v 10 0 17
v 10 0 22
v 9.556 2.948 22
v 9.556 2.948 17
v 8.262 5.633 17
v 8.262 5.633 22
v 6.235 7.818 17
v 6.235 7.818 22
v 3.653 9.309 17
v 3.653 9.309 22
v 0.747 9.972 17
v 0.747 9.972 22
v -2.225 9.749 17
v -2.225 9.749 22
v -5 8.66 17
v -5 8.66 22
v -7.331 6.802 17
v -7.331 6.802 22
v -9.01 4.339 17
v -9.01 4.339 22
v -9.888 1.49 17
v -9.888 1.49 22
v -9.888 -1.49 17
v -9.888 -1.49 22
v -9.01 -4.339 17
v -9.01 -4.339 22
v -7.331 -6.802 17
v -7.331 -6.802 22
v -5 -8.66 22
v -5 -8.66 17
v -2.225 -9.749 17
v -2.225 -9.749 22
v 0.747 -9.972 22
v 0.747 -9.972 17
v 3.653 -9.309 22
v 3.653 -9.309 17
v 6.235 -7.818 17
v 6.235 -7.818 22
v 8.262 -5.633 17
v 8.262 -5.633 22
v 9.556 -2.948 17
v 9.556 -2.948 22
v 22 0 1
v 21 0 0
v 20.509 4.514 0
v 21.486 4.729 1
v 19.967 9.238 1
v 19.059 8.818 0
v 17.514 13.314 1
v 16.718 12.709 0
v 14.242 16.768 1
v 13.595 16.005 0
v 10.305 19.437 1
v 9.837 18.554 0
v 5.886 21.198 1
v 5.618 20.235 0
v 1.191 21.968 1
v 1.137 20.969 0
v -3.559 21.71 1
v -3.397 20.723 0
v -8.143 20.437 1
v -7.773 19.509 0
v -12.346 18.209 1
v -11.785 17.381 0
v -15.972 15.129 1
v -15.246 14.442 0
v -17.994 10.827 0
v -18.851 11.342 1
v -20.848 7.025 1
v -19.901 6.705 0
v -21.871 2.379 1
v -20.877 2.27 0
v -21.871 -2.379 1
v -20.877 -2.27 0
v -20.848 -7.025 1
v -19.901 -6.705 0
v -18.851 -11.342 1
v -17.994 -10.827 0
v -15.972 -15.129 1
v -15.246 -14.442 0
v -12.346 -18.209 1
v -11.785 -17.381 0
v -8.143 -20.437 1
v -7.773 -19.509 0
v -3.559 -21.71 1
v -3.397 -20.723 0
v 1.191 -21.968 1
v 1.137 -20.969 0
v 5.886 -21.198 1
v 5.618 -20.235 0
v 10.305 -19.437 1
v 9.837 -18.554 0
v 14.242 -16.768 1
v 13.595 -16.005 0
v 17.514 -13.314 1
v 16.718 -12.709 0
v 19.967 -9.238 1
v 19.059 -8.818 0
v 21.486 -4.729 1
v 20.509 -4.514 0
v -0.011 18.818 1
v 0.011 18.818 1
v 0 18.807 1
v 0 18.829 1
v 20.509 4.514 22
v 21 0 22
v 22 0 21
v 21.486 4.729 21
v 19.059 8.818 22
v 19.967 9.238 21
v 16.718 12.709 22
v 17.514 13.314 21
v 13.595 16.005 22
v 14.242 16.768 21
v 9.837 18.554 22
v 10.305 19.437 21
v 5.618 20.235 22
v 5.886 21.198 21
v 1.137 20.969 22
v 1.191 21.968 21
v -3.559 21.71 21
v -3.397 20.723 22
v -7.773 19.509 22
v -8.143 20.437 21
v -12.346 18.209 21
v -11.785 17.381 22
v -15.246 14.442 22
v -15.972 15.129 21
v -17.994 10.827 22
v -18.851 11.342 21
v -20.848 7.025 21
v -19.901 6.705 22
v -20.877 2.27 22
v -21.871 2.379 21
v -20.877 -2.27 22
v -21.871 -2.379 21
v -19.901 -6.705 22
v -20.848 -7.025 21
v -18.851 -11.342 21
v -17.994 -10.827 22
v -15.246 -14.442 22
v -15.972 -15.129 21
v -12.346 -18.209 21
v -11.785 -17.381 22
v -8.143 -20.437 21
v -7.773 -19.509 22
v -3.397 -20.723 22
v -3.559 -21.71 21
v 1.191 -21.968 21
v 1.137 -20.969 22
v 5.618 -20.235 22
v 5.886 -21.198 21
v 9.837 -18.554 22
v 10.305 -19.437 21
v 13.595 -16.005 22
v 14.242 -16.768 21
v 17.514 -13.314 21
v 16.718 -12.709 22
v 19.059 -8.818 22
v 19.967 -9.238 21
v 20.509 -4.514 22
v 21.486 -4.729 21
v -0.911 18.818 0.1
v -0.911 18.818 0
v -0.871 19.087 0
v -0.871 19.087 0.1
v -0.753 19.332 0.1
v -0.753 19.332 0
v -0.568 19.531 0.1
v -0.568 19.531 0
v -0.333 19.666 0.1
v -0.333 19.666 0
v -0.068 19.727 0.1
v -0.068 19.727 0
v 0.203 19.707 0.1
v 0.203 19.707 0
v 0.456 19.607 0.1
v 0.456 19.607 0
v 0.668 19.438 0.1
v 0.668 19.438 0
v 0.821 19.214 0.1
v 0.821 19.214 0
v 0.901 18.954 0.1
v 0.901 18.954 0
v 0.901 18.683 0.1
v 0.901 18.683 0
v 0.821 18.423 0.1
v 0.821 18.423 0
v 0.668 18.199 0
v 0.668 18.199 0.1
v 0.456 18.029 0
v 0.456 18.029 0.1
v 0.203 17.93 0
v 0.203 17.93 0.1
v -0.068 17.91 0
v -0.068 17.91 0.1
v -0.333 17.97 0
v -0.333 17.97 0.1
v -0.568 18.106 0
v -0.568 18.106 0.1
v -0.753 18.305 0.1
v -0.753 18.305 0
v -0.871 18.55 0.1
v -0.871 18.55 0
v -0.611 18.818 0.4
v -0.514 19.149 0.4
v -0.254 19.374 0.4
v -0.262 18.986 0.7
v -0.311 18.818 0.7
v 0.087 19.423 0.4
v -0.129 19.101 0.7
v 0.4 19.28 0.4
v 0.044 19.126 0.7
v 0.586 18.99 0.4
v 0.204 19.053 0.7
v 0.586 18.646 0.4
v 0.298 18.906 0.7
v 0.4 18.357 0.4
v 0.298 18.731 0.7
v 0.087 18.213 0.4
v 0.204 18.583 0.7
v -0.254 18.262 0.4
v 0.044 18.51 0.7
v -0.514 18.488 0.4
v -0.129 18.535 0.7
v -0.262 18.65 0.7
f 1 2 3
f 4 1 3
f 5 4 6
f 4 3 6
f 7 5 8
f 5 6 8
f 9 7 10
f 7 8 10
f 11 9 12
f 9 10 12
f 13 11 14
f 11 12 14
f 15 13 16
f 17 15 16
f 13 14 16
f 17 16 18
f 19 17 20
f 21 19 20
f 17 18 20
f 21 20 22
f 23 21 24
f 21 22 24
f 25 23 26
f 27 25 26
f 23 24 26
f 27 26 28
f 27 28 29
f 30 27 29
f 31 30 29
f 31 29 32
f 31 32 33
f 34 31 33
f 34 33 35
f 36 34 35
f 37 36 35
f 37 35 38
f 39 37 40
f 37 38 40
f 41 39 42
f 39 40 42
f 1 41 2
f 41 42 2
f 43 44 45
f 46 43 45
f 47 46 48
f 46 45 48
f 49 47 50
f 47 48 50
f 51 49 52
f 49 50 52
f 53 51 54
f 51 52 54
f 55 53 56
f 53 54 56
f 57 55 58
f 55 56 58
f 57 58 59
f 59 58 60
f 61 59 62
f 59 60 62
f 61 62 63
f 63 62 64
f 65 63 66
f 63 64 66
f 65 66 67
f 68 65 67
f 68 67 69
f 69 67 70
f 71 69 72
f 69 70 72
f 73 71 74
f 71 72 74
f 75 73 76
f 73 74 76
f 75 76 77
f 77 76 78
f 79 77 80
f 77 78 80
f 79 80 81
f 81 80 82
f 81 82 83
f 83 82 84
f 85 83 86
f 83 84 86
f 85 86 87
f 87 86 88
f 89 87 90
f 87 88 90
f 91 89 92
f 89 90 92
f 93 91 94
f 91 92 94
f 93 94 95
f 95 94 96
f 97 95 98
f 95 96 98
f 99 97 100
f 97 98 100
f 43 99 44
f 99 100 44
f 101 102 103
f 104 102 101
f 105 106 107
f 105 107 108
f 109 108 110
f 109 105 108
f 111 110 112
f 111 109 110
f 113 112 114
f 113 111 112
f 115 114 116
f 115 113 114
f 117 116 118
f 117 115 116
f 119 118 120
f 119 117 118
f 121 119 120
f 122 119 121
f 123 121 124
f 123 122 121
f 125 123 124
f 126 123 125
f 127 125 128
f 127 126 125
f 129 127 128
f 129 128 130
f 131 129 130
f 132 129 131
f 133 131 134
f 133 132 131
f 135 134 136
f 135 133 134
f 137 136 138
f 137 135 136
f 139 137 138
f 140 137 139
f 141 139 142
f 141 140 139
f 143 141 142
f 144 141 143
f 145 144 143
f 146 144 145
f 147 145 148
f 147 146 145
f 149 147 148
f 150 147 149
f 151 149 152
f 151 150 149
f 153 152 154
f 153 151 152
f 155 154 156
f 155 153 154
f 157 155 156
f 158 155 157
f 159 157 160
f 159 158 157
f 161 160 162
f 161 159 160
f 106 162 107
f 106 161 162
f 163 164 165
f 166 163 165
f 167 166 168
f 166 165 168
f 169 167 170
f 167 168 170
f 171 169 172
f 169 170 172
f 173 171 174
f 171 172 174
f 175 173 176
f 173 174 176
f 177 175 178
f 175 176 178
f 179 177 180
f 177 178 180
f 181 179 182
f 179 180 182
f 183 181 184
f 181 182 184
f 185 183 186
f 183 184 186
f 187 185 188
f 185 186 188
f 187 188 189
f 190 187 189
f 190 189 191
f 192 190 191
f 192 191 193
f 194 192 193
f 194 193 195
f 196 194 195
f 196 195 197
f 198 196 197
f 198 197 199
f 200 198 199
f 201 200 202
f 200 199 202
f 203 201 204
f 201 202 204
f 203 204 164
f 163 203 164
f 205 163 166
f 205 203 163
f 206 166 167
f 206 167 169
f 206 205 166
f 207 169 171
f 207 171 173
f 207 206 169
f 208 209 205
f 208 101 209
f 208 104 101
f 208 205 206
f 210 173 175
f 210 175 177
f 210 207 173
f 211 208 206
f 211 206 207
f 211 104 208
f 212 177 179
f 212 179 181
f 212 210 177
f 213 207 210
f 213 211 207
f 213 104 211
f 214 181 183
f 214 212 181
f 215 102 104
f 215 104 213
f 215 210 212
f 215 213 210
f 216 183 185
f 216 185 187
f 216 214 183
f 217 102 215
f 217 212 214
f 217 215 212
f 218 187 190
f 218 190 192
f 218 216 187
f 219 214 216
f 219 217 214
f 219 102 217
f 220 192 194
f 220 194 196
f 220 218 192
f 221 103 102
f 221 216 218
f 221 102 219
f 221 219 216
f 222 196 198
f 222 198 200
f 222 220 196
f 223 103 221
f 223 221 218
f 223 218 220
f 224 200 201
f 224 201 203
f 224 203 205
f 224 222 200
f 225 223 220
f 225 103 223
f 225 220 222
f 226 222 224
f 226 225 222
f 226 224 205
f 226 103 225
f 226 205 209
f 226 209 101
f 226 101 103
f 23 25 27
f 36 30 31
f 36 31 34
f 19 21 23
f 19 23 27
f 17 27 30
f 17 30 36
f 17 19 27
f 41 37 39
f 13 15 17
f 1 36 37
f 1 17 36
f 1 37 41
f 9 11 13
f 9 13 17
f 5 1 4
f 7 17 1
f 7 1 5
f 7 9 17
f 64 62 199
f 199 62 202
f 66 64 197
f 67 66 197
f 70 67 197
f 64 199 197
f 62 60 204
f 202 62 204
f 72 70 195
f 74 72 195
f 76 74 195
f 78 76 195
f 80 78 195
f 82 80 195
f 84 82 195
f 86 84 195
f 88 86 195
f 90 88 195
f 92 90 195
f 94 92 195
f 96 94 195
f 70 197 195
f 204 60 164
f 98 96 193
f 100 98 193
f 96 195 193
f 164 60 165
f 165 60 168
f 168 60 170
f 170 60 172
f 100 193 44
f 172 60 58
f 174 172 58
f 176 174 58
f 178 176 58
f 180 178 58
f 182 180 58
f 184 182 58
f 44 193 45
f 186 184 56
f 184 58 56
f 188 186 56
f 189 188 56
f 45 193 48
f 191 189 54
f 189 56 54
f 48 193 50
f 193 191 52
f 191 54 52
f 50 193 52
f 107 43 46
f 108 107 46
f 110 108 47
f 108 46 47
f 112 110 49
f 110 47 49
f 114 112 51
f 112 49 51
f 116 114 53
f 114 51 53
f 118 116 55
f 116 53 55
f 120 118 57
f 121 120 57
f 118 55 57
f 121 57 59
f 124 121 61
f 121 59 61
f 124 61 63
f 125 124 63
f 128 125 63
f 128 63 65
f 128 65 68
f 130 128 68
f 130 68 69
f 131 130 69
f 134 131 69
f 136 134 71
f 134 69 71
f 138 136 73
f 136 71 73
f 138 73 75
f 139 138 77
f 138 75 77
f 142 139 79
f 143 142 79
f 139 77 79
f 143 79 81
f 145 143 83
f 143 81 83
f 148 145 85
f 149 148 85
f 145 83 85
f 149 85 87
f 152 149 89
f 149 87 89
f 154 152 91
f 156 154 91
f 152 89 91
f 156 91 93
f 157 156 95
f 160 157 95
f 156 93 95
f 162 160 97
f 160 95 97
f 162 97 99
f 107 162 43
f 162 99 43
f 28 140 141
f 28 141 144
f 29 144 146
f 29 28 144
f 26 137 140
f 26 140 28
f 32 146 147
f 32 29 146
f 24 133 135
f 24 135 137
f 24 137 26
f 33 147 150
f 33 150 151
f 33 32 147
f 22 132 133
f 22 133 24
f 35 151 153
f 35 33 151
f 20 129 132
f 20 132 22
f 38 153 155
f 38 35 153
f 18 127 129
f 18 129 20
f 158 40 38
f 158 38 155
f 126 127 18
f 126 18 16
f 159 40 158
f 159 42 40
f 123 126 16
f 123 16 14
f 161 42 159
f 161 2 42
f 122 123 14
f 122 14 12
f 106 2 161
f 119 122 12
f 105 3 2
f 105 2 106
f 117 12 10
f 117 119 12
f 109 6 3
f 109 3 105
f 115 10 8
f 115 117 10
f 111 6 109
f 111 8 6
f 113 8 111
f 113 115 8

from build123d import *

# Parameters (mm, degrees)
SKETCH_1_R          = 22
EXTRUDE_1_DEPTH     = 22
SKETCH_2_R          = 10
CUT_EXTRUDE_1_DEPTH = 5
CHAMFER_1_SIZE      = 1
SKETCH_3_R          = 0.911044844
CUT_EXTRUDE_2_DEPTH = 1
CHAMFER_2_SIZE      = 0.9


with BuildPart() as part:
    # 草图1 → 凸台-拉伸1 (new body)
    with BuildSketch(Plane.XY):
        Circle(SKETCH_1_R)
    extrude(amount=EXTRUDE_1_DEPTH)

    # 草图2 → 切除-拉伸1 (cut)
    with BuildSketch(Plane.XY.offset(22)):
        Circle(SKETCH_2_R)
    extrude(amount=-CUT_EXTRUDE_1_DEPTH, mode=Mode.SUBTRACT)

    # 倒角1
    chamfer_1_edges = [part.edges().sort_by_distance(p)[0] for p in [
        (-22, 0, 0),
        (-22, 0, 22),
    ]]
    chamfer(chamfer_1_edges, length=CHAMFER_1_SIZE)

    # 草图3 → 切除-拉伸2 (cut)
    with BuildSketch(Plane(origin=(0, 0, 0), x_dir=(-1, 0, 0), z_dir=(0, 0, -1))):
        with Locations((0, 18.818302181)):
            Circle(SKETCH_3_R)
    extrude(amount=-CUT_EXTRUDE_2_DEPTH, mode=Mode.SUBTRACT)

    # 倒角2
    chamfer_2_edges = [part.edges().sort_by_distance(p)[0] for p in [
        (0.911044844, 18.818302181, 1),
    ]]
    chamfer(chamfer_2_edges, length=CHAMFER_2_SIZE)


solid = part.part
